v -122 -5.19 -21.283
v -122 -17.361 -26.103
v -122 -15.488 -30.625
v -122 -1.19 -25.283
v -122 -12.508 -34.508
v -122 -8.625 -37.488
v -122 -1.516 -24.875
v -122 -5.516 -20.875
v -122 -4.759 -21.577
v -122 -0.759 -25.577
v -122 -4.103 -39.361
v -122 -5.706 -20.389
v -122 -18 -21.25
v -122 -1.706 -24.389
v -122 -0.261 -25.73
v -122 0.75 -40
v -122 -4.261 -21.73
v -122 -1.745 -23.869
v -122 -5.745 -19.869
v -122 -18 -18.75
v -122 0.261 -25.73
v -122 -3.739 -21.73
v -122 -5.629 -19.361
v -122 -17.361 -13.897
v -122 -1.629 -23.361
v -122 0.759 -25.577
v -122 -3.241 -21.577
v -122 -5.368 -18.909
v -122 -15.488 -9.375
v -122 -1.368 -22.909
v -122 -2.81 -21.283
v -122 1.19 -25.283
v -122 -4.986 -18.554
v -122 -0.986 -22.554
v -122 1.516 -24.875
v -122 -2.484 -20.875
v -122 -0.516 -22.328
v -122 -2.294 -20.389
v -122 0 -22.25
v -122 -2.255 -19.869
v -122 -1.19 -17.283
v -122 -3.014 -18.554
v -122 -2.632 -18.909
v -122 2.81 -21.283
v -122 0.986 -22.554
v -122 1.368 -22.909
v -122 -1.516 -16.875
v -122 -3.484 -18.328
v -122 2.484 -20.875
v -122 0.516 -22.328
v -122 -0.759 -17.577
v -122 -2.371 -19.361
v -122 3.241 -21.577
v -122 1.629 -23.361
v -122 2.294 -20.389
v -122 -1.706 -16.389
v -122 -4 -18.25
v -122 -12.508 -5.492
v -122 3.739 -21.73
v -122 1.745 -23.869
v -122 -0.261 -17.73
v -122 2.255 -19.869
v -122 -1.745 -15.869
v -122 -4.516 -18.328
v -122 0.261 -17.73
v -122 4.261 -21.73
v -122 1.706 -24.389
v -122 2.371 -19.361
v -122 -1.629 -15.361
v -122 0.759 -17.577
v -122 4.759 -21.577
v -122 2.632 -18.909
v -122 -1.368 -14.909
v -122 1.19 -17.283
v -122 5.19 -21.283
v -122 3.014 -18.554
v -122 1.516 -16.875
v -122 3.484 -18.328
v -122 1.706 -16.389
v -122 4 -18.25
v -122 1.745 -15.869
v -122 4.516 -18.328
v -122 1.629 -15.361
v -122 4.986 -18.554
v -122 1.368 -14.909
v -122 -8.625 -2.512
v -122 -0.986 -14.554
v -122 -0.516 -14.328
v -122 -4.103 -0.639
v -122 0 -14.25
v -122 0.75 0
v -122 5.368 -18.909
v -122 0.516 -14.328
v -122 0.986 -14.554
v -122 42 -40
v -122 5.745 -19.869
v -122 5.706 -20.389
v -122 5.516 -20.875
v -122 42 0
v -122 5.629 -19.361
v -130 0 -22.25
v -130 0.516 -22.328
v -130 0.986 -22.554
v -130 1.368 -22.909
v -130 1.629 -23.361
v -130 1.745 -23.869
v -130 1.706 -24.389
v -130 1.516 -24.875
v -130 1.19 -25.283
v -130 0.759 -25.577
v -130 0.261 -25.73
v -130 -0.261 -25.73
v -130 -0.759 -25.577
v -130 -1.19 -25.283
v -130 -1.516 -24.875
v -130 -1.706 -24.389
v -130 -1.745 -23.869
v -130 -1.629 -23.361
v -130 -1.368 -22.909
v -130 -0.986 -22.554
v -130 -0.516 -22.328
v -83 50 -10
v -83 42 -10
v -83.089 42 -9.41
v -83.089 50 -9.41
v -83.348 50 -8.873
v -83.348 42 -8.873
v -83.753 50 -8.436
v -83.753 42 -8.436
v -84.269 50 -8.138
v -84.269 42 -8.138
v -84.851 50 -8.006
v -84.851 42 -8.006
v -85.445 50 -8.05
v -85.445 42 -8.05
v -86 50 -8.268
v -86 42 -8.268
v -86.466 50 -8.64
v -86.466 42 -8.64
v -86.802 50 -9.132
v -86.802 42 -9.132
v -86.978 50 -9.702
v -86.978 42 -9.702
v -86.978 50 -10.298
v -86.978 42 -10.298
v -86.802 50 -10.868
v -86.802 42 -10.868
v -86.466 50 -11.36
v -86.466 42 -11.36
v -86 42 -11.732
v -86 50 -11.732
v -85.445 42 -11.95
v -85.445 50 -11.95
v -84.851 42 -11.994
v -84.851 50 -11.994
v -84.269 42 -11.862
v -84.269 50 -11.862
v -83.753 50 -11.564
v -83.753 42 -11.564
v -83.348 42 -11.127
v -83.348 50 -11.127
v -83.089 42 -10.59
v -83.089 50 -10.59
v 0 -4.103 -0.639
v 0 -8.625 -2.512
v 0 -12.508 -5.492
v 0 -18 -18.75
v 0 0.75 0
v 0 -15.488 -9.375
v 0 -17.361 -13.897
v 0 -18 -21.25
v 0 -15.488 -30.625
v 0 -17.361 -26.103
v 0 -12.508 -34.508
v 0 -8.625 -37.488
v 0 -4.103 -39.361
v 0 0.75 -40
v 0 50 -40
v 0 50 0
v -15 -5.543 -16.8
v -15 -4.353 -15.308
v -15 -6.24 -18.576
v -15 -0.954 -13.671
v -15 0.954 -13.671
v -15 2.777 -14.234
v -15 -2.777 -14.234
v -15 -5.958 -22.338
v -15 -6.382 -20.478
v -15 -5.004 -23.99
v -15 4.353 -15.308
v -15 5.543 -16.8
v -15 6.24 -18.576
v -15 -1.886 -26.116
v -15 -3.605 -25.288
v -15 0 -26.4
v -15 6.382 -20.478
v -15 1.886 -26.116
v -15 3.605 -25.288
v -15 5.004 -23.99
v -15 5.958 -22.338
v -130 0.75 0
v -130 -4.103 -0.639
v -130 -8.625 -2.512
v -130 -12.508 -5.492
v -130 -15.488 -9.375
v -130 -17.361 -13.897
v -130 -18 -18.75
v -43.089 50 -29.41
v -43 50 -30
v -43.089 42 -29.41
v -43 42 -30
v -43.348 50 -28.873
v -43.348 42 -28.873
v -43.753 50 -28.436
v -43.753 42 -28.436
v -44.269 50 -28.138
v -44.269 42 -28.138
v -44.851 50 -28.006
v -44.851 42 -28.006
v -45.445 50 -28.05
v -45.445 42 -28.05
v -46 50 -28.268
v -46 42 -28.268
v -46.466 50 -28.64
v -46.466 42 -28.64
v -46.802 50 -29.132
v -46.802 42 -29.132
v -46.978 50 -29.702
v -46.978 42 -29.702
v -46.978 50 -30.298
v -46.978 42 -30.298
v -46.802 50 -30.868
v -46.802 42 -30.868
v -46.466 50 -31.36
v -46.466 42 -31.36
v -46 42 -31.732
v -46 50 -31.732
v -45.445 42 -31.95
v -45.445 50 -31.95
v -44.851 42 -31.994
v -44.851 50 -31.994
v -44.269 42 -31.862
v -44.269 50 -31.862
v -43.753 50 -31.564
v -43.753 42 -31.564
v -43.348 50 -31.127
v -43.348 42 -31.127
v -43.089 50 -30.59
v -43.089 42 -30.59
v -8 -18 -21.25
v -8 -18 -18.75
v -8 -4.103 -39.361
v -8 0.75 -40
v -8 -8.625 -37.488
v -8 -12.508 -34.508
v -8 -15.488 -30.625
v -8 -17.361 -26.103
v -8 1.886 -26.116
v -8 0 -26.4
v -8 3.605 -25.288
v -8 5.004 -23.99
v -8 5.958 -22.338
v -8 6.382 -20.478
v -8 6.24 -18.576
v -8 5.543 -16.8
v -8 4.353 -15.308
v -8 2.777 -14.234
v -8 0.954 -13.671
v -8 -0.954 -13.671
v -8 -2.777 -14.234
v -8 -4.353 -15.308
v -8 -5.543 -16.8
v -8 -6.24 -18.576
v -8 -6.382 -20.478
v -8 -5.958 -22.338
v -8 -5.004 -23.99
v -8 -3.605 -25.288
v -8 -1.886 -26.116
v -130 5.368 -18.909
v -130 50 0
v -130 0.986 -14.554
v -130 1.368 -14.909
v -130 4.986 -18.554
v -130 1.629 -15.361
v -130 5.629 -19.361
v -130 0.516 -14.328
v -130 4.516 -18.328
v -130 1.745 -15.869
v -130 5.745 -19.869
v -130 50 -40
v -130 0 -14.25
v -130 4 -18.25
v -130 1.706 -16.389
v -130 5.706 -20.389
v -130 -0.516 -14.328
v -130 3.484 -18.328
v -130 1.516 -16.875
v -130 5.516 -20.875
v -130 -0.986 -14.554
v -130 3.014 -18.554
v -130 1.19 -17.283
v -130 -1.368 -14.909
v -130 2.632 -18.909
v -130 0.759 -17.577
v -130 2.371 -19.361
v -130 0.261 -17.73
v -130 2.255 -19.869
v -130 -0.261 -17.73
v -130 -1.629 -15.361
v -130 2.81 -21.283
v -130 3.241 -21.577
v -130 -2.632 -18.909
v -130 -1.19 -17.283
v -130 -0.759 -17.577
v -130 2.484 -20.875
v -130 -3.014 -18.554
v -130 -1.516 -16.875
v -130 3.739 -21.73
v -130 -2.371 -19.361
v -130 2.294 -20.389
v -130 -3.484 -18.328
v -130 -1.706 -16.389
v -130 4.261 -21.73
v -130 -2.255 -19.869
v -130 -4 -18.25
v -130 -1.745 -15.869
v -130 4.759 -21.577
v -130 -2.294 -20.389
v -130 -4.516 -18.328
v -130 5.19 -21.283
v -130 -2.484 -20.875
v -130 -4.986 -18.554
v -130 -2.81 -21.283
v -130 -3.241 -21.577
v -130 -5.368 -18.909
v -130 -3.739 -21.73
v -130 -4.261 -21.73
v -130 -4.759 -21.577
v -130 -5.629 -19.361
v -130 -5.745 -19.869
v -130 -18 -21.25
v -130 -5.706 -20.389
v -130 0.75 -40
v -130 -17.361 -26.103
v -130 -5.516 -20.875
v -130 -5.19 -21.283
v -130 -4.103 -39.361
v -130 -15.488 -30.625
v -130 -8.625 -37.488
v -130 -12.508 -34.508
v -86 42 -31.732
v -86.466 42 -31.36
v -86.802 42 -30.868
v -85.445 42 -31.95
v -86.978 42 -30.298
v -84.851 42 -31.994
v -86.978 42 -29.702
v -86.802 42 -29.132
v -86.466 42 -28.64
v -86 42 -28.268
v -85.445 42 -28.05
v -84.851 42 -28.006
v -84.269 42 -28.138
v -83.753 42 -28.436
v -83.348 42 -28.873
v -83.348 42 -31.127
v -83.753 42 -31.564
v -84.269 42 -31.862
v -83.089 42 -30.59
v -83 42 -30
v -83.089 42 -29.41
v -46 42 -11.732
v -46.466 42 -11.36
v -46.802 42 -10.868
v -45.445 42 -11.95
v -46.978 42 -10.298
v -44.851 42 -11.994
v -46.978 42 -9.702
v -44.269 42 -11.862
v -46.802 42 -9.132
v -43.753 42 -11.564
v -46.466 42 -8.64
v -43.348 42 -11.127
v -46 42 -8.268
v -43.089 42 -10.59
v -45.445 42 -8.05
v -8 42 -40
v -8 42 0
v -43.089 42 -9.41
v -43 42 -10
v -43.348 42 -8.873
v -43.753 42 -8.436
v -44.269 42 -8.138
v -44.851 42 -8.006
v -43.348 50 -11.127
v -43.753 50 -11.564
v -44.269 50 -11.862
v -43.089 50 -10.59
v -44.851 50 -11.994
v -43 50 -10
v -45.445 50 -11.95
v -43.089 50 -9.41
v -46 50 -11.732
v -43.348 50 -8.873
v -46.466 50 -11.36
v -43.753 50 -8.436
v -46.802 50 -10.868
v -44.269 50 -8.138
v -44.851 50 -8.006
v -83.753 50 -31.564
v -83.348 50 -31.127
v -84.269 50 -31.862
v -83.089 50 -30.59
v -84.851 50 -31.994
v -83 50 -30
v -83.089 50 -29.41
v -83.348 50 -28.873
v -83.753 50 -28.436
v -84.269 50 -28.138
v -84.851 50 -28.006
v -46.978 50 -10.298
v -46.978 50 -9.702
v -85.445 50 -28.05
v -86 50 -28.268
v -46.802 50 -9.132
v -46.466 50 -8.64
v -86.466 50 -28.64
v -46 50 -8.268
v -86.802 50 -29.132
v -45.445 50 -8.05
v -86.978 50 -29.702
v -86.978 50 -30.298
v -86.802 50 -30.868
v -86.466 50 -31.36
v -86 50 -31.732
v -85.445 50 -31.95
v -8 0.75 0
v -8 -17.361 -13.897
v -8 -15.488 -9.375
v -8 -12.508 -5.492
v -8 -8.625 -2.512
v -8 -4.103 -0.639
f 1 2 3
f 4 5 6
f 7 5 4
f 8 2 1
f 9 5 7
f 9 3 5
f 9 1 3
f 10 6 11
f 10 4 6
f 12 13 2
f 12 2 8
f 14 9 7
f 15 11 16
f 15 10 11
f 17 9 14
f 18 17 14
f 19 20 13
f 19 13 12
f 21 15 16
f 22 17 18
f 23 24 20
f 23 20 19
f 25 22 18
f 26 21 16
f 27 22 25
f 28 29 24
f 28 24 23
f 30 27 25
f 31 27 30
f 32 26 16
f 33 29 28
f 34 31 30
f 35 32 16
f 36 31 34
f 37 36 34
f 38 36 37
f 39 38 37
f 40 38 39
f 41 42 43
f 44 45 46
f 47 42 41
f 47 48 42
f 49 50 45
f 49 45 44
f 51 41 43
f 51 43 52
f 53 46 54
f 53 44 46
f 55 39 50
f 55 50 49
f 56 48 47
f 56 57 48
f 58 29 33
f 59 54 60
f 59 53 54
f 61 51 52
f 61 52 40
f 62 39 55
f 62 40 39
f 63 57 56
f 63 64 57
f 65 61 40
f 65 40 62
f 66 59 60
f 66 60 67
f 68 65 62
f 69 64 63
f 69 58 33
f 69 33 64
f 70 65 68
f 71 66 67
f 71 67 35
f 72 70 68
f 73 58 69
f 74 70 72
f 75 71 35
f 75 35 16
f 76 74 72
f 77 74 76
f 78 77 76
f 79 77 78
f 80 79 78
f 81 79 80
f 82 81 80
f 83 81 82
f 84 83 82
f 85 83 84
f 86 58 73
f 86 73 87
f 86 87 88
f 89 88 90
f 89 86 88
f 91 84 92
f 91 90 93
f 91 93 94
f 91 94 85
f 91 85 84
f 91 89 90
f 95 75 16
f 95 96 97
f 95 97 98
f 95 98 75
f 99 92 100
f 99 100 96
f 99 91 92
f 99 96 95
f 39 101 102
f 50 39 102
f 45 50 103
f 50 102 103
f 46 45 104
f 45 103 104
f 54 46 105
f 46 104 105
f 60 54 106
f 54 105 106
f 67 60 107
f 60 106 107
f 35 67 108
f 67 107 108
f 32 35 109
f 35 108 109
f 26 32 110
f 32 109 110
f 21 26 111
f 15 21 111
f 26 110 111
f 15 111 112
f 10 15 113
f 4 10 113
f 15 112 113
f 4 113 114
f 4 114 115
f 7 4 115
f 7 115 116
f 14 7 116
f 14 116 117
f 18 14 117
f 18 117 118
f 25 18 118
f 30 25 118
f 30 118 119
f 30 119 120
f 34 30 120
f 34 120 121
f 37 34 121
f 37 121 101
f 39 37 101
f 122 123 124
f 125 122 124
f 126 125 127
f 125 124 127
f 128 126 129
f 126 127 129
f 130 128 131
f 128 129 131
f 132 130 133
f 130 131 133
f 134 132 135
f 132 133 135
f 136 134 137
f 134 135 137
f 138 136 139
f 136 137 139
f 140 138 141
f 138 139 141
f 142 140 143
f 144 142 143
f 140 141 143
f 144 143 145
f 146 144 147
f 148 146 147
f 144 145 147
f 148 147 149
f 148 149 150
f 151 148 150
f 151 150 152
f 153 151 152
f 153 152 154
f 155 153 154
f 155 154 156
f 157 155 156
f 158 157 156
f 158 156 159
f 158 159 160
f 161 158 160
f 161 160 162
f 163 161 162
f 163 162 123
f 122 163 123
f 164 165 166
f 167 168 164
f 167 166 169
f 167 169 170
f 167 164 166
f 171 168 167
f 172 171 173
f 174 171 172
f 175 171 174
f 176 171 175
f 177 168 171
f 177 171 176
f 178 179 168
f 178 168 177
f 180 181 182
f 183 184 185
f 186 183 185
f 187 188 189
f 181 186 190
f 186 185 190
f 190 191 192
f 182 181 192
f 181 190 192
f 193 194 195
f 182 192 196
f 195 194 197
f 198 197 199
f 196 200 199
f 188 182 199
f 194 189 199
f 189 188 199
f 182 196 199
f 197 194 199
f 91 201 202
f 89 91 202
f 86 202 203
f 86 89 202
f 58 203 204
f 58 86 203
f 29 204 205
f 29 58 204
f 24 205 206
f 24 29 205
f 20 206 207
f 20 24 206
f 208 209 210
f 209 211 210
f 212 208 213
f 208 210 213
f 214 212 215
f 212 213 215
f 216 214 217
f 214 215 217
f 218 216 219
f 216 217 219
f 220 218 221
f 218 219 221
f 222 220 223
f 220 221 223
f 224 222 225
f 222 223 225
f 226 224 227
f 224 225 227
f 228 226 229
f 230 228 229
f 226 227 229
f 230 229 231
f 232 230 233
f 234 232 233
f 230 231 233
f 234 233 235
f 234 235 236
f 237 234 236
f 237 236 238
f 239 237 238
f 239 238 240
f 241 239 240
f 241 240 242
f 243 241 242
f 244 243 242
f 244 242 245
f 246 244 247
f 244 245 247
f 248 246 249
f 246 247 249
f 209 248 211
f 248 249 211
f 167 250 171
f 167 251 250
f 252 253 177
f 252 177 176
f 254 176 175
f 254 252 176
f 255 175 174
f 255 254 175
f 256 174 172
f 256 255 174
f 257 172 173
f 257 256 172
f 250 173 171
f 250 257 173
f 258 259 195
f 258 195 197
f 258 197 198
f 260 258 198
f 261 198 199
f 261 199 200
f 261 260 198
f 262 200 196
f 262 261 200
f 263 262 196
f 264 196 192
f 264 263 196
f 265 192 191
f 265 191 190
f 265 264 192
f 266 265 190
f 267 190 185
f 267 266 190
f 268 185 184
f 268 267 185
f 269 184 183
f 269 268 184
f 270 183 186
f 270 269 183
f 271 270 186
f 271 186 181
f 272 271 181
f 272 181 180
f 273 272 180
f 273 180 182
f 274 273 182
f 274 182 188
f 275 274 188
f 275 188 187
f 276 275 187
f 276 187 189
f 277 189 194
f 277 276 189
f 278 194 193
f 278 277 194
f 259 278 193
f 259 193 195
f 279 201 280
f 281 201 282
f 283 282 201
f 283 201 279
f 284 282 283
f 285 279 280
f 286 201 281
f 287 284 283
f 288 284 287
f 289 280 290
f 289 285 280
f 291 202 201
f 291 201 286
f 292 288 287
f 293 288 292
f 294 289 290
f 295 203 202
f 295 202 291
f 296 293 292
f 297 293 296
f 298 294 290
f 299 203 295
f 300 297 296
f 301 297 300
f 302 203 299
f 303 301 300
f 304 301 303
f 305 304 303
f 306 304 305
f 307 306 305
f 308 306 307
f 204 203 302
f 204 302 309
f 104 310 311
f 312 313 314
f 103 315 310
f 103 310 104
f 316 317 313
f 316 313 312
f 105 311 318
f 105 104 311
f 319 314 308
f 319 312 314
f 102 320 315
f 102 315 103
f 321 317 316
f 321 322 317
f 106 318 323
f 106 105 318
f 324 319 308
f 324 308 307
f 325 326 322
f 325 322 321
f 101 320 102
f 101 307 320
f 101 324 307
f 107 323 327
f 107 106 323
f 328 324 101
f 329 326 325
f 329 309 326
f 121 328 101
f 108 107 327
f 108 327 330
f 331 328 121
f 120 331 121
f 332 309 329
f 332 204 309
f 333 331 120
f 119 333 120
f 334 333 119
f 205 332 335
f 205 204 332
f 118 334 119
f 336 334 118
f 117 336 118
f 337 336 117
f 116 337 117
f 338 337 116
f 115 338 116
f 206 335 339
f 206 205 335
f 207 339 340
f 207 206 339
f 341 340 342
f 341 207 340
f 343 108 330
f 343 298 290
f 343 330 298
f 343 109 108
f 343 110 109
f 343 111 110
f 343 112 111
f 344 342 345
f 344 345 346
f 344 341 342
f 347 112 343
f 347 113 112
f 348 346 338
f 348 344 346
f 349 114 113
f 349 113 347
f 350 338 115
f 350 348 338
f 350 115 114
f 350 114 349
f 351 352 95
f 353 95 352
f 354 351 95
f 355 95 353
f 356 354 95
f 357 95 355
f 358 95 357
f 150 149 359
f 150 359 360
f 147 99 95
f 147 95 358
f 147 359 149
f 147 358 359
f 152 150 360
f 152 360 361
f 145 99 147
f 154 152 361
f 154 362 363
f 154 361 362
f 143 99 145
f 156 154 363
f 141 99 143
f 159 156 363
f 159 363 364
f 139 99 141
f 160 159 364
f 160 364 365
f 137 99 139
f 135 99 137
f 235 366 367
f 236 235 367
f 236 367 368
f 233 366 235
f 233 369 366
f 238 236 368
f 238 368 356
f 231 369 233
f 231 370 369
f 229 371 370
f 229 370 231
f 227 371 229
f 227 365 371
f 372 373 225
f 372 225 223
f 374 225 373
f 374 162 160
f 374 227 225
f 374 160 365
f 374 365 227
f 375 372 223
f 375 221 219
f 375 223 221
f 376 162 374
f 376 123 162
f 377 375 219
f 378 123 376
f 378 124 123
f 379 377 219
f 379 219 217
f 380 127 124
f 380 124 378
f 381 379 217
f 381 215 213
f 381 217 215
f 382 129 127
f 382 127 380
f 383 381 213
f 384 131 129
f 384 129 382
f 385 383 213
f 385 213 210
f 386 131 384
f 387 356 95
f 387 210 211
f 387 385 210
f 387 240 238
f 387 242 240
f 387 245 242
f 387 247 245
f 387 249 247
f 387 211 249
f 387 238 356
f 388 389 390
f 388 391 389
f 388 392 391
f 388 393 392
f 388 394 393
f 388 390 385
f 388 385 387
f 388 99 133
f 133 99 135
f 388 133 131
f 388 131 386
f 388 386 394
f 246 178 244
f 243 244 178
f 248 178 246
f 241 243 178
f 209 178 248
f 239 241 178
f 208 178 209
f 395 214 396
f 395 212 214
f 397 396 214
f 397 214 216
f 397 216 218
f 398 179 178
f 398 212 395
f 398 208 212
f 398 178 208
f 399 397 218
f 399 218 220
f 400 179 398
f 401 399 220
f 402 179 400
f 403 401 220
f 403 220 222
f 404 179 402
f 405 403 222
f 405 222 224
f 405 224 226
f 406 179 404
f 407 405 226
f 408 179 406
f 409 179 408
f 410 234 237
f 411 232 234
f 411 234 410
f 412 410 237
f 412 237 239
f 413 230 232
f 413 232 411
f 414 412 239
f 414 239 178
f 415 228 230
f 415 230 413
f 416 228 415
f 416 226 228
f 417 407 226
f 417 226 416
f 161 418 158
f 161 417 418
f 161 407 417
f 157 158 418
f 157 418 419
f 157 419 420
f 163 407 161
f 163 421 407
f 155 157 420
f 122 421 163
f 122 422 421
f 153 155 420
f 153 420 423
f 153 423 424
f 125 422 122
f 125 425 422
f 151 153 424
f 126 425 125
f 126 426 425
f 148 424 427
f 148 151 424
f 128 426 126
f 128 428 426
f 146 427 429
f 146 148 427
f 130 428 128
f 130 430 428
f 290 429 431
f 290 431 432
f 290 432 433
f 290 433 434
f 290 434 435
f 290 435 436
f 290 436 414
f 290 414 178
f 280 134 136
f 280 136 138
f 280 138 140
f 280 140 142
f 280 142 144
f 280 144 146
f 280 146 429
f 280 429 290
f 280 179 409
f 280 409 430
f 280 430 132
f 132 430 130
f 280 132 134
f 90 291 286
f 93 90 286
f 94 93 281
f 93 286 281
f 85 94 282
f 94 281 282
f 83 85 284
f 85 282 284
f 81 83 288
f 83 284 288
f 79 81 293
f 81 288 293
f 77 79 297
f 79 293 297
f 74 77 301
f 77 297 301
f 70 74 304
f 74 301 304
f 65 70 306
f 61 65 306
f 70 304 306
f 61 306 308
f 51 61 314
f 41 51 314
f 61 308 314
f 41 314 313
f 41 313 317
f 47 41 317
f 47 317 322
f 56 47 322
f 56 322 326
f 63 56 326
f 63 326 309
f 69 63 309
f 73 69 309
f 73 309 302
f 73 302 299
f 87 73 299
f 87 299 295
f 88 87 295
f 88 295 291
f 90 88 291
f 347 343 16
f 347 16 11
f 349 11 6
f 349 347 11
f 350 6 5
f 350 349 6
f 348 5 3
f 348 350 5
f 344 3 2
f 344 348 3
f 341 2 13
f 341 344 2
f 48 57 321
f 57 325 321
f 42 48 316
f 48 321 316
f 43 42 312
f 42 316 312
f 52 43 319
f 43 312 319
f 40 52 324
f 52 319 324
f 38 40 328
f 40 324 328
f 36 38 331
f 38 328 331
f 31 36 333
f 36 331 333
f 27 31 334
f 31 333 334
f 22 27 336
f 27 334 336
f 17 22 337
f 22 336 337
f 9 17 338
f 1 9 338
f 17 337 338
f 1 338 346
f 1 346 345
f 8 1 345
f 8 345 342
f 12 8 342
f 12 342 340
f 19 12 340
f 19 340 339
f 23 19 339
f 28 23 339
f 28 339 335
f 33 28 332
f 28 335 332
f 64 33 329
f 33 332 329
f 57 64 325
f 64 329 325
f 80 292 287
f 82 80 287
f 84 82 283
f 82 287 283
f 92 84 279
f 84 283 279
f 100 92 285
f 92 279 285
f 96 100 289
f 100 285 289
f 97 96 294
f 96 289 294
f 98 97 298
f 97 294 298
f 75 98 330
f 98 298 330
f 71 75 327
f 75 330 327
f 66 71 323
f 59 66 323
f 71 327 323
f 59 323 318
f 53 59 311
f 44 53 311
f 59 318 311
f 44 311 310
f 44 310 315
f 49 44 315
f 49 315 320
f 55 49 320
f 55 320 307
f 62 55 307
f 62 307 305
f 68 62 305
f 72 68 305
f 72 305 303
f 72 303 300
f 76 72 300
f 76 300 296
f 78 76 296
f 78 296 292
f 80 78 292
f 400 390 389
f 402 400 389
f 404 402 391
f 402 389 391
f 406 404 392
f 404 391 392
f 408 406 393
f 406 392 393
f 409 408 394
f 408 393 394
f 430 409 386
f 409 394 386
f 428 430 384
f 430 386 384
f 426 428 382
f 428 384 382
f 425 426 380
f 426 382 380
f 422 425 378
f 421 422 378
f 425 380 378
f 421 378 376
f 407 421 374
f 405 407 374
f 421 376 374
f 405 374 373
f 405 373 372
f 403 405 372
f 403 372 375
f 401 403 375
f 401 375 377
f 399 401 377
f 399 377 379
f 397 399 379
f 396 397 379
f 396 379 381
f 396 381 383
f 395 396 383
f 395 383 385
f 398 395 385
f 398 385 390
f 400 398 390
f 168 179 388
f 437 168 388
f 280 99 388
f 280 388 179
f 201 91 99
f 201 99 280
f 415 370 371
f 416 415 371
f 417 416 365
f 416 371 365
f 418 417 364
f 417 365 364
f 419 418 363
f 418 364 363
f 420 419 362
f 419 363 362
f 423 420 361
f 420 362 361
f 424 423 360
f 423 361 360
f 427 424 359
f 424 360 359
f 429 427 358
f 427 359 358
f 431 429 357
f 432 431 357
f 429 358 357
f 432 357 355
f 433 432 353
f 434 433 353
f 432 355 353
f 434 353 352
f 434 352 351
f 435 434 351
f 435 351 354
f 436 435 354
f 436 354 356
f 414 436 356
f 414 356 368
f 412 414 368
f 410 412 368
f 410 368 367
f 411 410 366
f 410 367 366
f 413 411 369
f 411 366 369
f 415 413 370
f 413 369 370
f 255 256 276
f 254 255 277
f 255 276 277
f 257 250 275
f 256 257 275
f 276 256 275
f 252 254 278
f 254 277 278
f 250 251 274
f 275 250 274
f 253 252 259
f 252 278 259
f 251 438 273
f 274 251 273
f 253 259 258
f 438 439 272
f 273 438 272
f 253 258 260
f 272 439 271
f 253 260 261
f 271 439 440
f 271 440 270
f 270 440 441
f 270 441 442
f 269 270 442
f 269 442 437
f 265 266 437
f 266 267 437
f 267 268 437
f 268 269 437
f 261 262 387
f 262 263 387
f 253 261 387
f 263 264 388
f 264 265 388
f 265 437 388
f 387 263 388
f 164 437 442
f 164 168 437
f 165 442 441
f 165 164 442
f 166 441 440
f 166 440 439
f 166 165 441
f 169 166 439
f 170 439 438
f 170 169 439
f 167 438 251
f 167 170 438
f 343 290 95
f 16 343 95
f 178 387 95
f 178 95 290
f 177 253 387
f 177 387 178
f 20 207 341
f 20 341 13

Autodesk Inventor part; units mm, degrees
ref_plane "YZ Plane" through (0, 0, 0) normal (1, 0, 0) x (0, 1, 0)
ref_plane "XZ Plane" through (0, 0, 0) normal (0, 1, 0) x (-1, 0, 0)
ref_plane "XY Plane" through (0, 0, 0) normal (0, 0, 1) x (1, 0, 0)
sketch "Sketch1" plane through (0, 0, 0) normal (0, 1, 0) x (-1, 0, 0)
  line L0 (0, 0) -> (130, 0)
  line L1 (130, 0) -> (130, -40)
  line L2 (130, -40) -> (0, -40)
  line L3 (0, -40) -> (0, 0)
  dimension "d0" = 130
  dimension "d1" = 40
extrude "Extrusion1" add sketch "Sketch1" along normal blind 50
sketch "Sketch3" plane through (-130, 0, 0) normal (0, 0, 1) x (1, 0, 0)
  line L0 (130, 0) -> (0, 0) projected
  line L1 (0, 0) -> (8, 0)
  line L2 (8, 0) -> (8, 42)
  line L3 (130, 50) -> (0, 50) projected
  line L4 (122, 0) -> (122, 42)
  line L5 (8, 42) -> (122, 42)
  line L6 (8, 0) -> (122, 0)
  dimension "d8" = 8
  dimension "d9" = 42
extrude "Extrusion3" cut sketch "Sketch3" against normal through all
sketch "Sketch4" plane through (0, 0, 0) normal (0, -1, 0) x (1, 0, 0)
  line L0 (-130, -40) -> (-130, 0) projected
  line L1 (-8, -40) -> (-122, -40) projected
  line L2 (-130, 0) -> (-122, 0)
  line L3 (-122, 0) -> (-122, -40)
  line L4 (-122, -40) -> (-130, -40)
  line L5 (-130, -40) -> (-130, 0)
  line L6 (-8, 0) -> (0, 0)
  line L7 (0, 0) -> (0, -40)
  line L8 (0, -40) -> (-8, -40)
  line L9 (-8, -40) -> (-8, 0)
extrude "Extrusion4" add sketch "Sketch4" along normal blind 18
sketch "Sketch7" plane through (-130, 50, -40) normal (-1, 0, 0) x (0, 0, 1)
  line L0 (40, -68) -> (0, -68) projected
  line L1 (20, -68) -> (20, -50)
  circle A0 centre (20, -46) radius 1.75
  circle A1 centre (16, -50) radius 1.75
  circle A2 centre (20, -54) radius 1.75
  circle A3 centre (24, -50) radius 1.75
  point P0 (40, -50)
  dimension "d23" = 18
  dimension "d25" = 3.5
  dimension "d28" = 360
extrude "Extrusion6" cut sketch "Sketch7" against normal up to surface (8 mm away)
fillet "Fillet1" radius 18.75 4 edges at (-126, -18, -40) (-126, -18, 0) (-4, -18, 0) (-4, -18, -40)
sketch "Sketch8" plane through (0, 50, 0) normal (1, 0, 0) x (0, 0, -1)
  line L0 (16, -50) -> (24, -50)
  line L1 (20, -54) -> (20, -46)
  circle A0 centre (20, -50) radius 6.4
  point P0 (0, -50)
  dimension "d33" = 12.8
extrude "Extrusion7" add sketch "Sketch8" against normal blind 15
sketch "Sketch9" plane through (-122, 42, 0) normal (0, -1, 0) x (1, 0, 0)
  line L0 (-8, 0) -> (122, 0) projected
  line L1 (122, -40) -> (-8, -40) projected
  circle A0 centre (77, -10) radius 2
  circle A1 centre (77, -30) radius 2
  circle A2 centre (37, -30) radius 2
  circle A3 centre (37, -10) radius 2
  dimension "d40" = 4
extrude "Extrusion8" cut sketch "Sketch9" against normal through all
properties part number "tilt_output_bracket"
